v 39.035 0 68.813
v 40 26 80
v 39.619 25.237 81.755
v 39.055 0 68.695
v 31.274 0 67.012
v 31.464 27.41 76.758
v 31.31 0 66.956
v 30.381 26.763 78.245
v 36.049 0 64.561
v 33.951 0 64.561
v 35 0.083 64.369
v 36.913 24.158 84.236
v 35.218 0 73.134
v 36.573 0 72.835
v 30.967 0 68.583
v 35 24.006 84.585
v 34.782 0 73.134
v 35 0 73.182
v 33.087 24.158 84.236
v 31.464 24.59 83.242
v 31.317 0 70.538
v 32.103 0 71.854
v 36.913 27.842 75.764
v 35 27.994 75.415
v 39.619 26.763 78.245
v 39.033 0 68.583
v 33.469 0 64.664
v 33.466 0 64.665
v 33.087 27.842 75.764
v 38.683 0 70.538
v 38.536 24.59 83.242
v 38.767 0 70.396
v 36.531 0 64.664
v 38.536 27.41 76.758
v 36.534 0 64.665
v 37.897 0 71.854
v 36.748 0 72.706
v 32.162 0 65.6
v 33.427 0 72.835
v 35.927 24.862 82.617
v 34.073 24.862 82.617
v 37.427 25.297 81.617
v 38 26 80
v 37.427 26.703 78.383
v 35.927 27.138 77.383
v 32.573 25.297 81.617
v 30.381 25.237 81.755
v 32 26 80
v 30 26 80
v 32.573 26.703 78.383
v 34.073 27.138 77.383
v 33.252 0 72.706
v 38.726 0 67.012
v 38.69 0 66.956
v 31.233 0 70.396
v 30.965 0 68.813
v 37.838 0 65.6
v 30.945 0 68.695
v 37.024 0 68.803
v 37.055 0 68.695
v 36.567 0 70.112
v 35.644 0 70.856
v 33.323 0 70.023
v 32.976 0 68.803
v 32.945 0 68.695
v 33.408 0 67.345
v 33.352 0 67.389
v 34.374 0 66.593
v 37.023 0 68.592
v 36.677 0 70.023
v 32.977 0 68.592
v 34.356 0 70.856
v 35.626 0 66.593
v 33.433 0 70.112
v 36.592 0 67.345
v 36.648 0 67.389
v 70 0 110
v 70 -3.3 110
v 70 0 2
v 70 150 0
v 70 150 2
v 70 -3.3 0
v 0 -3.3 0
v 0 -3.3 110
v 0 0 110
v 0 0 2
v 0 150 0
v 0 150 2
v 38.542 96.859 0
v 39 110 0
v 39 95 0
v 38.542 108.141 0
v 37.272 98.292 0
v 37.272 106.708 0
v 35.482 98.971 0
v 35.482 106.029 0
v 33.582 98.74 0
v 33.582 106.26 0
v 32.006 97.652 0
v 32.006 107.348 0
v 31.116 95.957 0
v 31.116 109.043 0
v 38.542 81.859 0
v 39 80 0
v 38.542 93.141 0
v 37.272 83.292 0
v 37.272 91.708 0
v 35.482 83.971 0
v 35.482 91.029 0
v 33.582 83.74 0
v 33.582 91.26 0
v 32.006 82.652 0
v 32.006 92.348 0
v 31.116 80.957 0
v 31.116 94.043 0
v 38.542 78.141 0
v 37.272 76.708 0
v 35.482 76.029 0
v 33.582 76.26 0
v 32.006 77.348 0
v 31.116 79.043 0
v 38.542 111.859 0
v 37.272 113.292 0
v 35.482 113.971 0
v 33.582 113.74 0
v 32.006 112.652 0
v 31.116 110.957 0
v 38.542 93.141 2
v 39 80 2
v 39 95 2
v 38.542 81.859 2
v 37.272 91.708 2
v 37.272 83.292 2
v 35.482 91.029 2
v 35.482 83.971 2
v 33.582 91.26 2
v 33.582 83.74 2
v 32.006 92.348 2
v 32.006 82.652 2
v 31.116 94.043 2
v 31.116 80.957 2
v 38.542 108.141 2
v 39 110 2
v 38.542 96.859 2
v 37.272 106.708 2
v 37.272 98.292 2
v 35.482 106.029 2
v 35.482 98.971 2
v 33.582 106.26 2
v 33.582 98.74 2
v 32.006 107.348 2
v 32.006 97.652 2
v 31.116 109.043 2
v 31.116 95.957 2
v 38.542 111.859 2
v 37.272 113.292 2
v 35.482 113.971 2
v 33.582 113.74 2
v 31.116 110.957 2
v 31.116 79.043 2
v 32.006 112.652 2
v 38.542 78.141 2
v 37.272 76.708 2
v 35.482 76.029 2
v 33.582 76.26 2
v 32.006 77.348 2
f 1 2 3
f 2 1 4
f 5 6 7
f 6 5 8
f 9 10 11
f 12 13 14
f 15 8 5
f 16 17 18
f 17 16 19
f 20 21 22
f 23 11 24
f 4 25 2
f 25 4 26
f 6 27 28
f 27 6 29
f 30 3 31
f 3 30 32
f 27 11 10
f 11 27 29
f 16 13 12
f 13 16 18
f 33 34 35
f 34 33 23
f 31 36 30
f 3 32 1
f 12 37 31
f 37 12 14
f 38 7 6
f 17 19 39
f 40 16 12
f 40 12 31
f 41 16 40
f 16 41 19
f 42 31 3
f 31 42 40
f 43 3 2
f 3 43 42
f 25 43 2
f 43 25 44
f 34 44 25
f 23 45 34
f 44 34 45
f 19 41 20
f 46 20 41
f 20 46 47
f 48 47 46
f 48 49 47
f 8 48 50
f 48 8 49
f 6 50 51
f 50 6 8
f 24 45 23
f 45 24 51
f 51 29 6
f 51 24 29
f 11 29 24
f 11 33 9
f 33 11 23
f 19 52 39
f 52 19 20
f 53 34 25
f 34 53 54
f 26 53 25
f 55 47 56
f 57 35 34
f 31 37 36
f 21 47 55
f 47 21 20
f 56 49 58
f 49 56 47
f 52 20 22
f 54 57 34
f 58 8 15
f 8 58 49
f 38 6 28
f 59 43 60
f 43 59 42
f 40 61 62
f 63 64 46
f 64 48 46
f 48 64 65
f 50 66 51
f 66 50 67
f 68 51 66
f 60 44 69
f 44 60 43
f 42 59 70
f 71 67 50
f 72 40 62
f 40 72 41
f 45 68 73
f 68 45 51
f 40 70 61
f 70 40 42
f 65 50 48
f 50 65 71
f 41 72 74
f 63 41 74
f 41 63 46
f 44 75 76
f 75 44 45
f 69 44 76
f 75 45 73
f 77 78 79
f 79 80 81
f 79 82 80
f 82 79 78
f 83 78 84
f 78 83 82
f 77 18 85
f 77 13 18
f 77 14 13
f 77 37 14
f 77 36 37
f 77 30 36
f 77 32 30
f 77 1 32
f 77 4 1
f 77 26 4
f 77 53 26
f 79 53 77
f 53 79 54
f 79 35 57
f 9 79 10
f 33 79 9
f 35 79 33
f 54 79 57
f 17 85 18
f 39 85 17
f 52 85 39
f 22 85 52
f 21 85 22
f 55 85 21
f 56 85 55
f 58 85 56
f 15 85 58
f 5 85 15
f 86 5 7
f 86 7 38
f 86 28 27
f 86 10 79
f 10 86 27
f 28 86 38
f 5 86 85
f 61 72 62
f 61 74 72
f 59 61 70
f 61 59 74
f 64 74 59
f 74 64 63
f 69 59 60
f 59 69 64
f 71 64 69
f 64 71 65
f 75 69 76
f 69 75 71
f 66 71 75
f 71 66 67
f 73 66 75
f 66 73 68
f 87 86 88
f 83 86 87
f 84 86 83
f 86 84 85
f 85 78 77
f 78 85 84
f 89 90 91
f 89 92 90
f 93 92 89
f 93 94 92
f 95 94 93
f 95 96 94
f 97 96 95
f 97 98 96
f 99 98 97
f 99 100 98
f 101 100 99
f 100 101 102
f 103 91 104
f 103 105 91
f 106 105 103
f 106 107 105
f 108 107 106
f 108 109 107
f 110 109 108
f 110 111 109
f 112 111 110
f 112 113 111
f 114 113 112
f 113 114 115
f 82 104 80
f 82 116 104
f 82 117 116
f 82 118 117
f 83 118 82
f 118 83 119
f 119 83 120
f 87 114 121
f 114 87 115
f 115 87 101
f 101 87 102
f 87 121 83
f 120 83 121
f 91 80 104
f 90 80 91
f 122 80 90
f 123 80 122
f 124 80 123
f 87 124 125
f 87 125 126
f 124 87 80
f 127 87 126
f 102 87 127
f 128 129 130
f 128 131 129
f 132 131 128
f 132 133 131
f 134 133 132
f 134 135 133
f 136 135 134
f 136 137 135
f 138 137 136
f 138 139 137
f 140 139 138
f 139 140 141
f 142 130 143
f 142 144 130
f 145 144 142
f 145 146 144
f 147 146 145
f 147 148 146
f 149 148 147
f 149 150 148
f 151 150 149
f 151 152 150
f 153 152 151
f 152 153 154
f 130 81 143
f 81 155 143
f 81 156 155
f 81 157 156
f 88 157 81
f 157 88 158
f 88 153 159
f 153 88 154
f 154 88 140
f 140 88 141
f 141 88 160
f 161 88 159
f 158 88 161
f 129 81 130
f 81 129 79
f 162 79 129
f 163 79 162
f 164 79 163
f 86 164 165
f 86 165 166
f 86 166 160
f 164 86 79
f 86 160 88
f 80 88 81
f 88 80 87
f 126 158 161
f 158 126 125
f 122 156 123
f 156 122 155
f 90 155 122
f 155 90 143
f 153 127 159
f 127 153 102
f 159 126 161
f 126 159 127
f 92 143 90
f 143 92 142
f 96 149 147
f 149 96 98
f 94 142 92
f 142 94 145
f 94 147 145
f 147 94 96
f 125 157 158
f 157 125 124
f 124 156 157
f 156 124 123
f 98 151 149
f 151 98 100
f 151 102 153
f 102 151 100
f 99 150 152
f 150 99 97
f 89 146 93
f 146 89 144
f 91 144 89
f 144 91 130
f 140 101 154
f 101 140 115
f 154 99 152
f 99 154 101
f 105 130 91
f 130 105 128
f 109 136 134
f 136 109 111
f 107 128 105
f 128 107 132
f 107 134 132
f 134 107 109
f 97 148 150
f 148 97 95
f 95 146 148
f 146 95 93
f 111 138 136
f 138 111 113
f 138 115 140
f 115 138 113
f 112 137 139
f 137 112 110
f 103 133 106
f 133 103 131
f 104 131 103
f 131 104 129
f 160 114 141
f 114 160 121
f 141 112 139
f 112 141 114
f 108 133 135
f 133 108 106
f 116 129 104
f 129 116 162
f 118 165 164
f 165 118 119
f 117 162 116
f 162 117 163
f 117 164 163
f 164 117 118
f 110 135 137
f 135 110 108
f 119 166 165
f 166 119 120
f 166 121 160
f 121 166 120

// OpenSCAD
distance_premier_trou = 40;
espacement_entre_trous = 15;
angle_deux_plaques=90;
largeur_plaque=70;
angle_support_terre=23.5;
taille_tube=30;
diametre_trou_lumiere=4;

rotate([angle_deux_plaques, 0, 0]) {
    cube([largeur_plaque, 110, 3.3]); 
    translate([35, 80, -26]) {
         rotate([angle_support_terre,0,0]){
 difference(){         
cylinder(taille_tube, 5, 4);
cylinder(taille_tube, 3, 2);
            }
            }
     }
}

difference() {
cube([largeur_plaque, 150, 2]);
 translate([35, 150-distance_premier_trou, 0]) {
cylinder(3, diametre_trou_lumiere, diametre_trou_lumiere);
     }
      translate([35, 150-distance_premier_trou-espacement_entre_trous, 0]) {
cylinder(3, diametre_trou_lumiere, diametre_trou_lumiere);
     }
      translate([35, 150-distance_premier_trou-espacement_entre_trous-espacement_entre_trous, 0]) {
cylinder(3, diametre_trou_lumiere, diametre_trou_lumiere);
     }
}
